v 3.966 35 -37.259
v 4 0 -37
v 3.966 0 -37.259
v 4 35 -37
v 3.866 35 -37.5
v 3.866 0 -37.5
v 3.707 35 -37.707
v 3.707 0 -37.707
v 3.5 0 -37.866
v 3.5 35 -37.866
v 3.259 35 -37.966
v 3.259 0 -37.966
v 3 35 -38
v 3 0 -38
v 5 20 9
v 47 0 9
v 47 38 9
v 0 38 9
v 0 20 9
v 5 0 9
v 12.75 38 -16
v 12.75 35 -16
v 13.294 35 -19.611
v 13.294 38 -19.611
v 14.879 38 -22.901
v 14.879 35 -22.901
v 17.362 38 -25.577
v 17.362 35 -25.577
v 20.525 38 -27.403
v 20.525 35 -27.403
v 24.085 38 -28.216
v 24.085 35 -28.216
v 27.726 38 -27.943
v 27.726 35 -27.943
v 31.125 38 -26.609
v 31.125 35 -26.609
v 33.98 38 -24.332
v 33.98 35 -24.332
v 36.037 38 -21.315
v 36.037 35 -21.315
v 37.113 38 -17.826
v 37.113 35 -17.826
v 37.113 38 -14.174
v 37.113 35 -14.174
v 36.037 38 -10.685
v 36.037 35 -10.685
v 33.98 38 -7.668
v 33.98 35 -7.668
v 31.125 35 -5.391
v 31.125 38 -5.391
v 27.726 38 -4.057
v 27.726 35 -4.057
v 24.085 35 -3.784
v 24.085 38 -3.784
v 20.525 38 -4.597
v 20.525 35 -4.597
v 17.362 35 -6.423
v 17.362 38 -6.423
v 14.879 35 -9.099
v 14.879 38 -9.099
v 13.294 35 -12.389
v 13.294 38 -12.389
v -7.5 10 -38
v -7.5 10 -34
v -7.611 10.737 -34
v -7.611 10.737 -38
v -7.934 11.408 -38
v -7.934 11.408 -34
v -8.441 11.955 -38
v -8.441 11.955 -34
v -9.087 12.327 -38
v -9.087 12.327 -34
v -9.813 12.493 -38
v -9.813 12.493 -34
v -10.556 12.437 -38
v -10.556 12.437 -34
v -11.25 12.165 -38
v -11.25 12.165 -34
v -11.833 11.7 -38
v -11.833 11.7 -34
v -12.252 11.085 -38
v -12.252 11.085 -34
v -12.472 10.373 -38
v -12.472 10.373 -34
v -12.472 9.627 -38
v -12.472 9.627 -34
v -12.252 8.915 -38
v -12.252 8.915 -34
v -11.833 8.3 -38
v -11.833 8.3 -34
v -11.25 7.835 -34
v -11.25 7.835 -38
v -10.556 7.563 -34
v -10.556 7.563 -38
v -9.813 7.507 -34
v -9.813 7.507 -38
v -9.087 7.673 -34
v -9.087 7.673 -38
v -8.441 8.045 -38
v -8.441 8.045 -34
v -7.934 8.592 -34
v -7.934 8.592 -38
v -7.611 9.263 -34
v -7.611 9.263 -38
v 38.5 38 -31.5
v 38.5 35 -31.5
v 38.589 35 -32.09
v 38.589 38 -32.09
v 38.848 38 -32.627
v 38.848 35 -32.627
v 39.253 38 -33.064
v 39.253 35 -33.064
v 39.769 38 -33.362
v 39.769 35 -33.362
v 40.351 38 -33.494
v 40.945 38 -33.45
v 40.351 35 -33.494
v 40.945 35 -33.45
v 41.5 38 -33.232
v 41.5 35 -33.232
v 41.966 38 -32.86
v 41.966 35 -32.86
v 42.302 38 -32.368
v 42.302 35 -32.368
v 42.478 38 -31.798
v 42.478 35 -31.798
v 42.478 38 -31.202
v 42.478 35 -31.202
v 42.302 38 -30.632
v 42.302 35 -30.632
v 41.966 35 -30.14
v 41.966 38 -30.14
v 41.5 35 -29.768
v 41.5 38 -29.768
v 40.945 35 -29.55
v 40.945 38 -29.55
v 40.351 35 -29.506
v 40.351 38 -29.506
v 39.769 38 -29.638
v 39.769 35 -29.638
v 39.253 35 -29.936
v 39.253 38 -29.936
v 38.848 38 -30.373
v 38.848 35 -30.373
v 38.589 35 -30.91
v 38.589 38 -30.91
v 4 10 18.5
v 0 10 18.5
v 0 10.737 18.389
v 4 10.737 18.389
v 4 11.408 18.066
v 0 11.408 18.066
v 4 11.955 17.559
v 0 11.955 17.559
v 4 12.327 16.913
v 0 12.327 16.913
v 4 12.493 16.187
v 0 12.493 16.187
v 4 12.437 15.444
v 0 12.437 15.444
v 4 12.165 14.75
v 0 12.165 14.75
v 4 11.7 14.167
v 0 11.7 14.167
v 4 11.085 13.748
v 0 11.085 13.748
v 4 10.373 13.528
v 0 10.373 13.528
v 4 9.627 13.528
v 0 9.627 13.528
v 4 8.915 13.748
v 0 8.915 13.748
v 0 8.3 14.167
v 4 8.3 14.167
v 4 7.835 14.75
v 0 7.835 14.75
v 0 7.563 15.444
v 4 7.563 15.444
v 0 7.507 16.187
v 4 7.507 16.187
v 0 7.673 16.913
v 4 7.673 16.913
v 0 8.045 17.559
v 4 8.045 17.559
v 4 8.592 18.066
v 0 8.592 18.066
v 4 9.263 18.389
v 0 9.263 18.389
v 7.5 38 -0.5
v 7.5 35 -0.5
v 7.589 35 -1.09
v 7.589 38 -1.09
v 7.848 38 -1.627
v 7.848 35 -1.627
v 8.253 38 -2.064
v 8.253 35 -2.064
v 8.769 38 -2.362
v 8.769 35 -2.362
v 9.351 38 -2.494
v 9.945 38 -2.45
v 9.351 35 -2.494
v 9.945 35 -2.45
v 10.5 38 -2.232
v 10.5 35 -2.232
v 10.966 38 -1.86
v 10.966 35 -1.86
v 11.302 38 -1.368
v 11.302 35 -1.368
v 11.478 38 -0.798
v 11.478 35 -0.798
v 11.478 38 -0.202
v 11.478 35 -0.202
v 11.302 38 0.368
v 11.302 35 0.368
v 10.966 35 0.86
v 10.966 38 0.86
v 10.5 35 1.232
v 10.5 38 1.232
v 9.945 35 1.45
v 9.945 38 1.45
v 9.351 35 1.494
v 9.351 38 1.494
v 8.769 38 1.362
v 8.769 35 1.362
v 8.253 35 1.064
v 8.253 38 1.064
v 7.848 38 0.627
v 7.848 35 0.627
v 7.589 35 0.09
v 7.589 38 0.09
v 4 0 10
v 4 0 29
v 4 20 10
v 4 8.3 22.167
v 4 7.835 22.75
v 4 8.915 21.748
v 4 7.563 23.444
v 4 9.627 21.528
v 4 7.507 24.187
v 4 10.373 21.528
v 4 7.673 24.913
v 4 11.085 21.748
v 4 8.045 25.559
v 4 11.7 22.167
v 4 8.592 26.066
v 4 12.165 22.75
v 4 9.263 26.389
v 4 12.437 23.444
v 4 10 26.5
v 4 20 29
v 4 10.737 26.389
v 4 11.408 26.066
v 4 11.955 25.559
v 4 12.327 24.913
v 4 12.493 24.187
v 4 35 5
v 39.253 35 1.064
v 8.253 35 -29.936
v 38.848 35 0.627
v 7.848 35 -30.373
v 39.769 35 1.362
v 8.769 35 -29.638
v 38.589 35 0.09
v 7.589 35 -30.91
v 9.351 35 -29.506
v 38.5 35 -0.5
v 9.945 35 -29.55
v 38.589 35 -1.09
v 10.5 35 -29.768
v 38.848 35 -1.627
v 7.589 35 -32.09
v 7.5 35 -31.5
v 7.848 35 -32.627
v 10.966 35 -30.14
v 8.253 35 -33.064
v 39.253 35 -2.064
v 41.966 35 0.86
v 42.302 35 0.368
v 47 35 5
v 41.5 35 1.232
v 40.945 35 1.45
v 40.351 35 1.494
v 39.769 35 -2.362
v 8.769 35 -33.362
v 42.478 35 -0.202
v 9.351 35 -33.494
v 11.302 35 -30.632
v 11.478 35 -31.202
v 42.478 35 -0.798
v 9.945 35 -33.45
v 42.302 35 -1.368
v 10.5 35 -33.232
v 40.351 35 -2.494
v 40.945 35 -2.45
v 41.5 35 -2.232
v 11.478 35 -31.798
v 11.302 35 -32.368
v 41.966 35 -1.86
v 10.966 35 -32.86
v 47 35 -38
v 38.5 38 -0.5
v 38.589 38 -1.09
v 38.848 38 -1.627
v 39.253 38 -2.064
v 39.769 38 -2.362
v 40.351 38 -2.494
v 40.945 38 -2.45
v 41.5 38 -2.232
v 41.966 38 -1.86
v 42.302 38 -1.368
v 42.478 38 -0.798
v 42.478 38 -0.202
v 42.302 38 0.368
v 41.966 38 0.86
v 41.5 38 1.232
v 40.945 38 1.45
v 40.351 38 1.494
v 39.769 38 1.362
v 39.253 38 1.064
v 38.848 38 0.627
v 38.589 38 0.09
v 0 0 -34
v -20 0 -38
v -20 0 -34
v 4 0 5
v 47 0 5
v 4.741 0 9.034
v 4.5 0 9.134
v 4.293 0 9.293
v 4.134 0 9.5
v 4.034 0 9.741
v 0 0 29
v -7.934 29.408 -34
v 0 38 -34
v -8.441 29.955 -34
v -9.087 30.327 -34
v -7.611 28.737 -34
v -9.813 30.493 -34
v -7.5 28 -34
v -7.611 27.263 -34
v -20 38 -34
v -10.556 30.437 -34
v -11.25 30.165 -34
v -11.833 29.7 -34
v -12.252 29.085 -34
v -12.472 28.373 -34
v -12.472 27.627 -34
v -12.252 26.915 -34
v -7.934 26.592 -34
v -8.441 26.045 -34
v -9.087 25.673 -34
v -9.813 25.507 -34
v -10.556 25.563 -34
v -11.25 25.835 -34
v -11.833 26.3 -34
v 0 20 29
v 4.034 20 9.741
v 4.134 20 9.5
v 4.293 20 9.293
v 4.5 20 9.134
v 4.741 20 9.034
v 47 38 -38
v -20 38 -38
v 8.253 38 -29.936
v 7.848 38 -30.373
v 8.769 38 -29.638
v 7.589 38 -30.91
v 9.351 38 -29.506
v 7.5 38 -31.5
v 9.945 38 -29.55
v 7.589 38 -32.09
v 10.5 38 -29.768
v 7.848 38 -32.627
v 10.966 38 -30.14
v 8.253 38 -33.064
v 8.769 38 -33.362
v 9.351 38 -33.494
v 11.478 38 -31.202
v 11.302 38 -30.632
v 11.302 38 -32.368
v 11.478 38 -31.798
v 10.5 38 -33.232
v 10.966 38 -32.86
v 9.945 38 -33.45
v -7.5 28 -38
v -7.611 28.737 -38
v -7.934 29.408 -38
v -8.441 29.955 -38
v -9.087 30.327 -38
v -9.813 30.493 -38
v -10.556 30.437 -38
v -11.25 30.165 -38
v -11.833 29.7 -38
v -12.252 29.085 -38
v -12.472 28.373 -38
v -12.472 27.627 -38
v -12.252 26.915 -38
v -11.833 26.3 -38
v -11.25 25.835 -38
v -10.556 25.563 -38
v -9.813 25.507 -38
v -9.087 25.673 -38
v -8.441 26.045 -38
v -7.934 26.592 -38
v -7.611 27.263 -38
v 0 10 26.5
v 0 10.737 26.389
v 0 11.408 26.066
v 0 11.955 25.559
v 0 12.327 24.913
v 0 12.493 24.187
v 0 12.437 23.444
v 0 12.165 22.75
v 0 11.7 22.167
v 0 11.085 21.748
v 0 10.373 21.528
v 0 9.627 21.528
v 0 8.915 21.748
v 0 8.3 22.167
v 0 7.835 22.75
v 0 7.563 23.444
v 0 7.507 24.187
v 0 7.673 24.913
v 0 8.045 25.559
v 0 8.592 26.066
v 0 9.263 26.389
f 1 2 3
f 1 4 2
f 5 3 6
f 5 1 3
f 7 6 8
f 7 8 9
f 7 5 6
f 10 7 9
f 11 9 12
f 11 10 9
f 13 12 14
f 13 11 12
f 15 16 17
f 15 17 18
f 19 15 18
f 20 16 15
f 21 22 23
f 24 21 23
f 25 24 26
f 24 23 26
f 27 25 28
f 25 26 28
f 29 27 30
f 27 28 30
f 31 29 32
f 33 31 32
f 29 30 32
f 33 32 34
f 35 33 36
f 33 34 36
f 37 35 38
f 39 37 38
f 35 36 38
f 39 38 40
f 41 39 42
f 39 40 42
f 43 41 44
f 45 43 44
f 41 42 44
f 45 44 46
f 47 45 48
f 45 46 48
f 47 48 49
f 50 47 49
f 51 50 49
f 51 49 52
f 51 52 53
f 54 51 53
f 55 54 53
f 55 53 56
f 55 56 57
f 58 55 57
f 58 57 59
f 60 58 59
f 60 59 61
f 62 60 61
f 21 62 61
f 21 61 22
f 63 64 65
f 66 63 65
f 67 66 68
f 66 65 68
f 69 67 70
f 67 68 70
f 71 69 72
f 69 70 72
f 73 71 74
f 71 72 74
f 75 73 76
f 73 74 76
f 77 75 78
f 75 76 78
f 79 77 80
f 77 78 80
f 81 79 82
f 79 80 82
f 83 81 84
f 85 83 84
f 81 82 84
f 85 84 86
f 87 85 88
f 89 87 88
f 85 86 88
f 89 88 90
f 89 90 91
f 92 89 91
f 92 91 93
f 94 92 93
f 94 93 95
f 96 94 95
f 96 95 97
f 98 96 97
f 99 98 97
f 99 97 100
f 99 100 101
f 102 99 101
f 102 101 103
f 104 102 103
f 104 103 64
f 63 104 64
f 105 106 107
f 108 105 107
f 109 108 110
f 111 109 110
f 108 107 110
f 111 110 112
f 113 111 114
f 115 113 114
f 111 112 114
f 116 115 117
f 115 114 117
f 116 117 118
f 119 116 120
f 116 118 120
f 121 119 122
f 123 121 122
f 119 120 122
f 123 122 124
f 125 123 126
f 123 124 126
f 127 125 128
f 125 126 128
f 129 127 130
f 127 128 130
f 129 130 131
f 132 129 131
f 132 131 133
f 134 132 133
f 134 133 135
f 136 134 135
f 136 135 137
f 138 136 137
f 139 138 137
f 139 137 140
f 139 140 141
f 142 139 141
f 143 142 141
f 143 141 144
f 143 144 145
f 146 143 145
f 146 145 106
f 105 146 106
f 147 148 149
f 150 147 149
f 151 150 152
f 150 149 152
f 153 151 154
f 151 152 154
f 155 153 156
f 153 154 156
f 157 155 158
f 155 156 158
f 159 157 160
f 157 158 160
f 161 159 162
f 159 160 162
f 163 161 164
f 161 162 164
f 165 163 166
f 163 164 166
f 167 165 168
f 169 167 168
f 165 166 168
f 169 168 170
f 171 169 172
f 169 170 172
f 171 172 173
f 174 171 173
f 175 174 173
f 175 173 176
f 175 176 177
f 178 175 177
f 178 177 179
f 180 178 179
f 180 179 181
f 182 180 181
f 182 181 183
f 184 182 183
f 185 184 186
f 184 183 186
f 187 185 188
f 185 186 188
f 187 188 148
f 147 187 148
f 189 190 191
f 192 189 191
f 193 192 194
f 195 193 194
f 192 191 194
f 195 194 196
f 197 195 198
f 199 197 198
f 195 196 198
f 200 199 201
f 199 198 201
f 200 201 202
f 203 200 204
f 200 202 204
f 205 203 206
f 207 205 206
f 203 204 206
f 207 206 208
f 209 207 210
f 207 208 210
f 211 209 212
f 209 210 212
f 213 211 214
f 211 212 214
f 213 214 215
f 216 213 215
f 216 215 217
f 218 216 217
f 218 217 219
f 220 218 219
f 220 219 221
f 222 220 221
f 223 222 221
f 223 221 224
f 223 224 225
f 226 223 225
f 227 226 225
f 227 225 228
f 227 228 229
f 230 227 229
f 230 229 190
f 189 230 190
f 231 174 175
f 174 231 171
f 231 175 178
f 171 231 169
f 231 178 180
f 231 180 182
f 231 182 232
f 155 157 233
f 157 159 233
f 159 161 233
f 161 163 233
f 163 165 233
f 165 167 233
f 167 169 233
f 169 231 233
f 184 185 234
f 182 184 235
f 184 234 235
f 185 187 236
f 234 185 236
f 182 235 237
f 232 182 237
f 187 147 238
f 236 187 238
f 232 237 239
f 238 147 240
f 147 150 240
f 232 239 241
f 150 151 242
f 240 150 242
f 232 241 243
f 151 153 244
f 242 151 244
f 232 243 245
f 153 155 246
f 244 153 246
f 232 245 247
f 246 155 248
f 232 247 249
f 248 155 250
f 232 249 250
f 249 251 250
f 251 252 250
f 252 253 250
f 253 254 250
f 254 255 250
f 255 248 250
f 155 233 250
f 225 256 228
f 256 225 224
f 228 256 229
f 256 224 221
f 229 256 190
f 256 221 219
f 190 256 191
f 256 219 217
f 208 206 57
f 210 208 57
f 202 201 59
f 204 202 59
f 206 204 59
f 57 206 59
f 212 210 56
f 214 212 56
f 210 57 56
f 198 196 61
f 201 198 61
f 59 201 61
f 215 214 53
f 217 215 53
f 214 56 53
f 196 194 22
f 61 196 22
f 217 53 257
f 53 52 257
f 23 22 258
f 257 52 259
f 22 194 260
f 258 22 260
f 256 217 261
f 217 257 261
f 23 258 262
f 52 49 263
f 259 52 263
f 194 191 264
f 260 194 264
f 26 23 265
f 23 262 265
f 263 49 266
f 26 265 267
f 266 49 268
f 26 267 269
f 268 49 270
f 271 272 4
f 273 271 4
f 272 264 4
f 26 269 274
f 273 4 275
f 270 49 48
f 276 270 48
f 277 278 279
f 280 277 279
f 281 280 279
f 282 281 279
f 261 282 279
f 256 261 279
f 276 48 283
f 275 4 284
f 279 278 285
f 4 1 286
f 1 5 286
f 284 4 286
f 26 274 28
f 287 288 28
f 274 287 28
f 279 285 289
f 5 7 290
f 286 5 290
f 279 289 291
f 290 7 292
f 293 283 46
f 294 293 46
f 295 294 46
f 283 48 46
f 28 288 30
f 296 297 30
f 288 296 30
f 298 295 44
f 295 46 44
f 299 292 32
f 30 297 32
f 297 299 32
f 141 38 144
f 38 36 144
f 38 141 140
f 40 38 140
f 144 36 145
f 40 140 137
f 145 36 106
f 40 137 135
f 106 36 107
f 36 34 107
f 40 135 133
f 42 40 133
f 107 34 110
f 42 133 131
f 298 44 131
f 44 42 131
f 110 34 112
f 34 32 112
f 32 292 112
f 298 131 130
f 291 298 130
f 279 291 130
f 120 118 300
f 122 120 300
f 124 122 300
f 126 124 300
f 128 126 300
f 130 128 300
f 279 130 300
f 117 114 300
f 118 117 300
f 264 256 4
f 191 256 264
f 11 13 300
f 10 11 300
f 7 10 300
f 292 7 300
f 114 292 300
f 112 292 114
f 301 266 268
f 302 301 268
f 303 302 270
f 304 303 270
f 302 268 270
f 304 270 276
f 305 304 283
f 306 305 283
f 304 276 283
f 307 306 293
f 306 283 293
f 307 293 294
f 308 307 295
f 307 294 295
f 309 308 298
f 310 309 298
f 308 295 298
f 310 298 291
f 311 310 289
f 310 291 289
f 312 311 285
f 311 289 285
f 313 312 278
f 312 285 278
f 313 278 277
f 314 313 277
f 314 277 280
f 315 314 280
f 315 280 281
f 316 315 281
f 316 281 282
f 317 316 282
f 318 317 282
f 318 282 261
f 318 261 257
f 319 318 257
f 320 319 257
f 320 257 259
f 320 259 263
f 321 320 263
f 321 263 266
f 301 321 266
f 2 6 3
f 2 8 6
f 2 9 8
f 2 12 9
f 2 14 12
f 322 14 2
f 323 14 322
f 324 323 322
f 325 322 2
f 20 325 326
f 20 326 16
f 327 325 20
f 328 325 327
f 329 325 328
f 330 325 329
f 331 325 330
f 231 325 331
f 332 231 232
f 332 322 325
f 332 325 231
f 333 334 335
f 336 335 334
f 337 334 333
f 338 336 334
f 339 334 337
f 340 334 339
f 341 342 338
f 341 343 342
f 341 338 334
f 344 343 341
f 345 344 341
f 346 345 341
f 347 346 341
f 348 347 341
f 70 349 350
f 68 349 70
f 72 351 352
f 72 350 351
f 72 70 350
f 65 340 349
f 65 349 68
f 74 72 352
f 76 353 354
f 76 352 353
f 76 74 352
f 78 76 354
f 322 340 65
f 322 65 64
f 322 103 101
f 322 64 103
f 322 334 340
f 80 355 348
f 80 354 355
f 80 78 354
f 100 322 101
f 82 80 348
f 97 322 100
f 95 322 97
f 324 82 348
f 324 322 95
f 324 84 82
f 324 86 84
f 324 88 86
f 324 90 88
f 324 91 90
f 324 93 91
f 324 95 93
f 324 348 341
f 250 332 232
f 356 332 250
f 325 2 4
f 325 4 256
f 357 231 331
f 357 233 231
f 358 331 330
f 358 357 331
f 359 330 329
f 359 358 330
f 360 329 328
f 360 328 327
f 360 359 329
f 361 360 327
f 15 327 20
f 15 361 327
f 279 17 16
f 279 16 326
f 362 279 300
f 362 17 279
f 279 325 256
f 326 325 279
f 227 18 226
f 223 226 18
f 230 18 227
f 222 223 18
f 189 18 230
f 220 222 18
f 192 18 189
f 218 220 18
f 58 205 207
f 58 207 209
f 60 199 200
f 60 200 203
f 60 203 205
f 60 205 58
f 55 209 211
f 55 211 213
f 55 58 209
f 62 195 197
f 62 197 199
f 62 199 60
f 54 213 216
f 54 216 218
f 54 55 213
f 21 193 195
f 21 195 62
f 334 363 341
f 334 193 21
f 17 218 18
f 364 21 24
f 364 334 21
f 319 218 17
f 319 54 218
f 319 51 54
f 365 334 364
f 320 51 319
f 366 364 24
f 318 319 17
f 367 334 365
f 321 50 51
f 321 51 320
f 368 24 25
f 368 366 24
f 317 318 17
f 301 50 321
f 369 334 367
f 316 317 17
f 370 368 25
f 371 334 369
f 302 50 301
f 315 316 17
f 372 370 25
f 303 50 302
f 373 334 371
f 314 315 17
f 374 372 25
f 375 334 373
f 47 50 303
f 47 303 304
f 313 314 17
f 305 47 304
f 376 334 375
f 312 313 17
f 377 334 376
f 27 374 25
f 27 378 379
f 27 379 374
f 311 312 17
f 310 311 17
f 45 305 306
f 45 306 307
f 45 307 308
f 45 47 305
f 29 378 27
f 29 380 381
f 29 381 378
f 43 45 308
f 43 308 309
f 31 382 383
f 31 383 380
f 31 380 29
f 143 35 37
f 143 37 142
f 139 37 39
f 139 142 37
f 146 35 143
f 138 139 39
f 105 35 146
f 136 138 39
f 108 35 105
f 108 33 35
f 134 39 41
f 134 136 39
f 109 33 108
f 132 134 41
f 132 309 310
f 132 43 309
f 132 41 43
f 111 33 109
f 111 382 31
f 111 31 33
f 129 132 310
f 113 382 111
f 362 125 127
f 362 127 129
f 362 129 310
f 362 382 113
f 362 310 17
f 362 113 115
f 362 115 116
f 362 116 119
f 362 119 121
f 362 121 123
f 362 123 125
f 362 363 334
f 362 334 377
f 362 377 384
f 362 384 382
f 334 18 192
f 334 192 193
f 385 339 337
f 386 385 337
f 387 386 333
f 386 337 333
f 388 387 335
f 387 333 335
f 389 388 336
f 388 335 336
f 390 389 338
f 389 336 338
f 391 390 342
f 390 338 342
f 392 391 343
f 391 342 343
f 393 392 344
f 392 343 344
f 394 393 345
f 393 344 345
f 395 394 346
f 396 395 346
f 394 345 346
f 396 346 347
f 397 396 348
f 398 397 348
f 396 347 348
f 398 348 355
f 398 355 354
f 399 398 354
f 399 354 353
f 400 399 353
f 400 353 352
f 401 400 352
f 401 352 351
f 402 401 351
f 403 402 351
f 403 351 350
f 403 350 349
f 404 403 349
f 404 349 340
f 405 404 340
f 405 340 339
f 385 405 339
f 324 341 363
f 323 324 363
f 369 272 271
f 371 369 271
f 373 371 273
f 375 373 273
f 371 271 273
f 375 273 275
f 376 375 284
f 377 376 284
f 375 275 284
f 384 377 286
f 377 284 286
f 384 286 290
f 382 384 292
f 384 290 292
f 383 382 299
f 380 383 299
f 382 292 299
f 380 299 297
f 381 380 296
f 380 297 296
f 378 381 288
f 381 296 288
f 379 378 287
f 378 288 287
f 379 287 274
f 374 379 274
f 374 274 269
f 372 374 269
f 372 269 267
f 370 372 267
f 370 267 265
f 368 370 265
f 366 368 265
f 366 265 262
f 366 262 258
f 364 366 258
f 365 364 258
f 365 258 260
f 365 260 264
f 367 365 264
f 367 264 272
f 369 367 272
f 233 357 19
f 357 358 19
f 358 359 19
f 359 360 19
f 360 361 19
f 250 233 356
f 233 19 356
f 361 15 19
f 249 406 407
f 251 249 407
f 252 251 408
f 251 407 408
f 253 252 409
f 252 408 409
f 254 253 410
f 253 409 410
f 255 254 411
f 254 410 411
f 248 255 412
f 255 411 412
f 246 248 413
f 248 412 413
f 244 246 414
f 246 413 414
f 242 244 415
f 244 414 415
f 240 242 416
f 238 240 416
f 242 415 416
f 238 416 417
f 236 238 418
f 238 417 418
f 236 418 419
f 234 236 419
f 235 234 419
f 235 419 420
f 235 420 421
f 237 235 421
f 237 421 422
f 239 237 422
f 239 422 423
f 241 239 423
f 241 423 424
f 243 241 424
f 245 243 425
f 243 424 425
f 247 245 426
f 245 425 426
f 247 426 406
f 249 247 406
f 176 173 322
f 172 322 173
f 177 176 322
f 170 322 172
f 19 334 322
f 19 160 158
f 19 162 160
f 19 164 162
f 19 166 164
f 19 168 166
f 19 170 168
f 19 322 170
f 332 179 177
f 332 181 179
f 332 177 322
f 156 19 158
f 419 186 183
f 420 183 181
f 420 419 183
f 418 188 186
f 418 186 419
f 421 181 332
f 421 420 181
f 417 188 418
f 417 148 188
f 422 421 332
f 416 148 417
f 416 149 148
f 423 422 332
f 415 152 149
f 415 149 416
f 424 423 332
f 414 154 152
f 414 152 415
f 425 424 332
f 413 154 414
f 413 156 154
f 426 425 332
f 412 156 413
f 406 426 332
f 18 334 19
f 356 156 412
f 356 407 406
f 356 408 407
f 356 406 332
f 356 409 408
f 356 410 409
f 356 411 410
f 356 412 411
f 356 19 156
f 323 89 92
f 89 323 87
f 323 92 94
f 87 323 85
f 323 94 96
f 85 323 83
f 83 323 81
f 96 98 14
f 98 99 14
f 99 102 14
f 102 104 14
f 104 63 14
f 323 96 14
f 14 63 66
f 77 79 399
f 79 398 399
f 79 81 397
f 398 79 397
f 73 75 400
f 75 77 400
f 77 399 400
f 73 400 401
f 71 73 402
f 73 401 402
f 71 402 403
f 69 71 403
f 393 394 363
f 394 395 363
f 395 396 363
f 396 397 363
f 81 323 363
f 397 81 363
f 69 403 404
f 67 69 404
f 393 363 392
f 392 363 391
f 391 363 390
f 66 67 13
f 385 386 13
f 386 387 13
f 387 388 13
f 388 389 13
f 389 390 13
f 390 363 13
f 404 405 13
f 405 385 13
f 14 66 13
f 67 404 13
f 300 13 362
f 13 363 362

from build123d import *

# Parameters (mm, degrees)
BOSS_EXTRUDE1_DEPTH = 38
SKETCH2_W           = 43
SKETCH2_H           = 43
BOSS_EXTRUDE2_DEPTH = 3
SKETCH3_R           = 2
SKETCH3_R_2         = 12.25
CUT_EXTRUDE1_DEPTH  = 10
SKETCH4_R           = 2.5
CUT_EXTRUDE2_DEPTH  = 10
SKETCH5_W           = 20
SKETCH5_H           = 20
SKETCH5_R           = 2.5
BOSS_EXTRUDE3_DEPTH = 4
FILLET1_R           = 1


with BuildPart() as part:
    # Sketch1 → Boss-Extrude1 (new body)
    with BuildSketch(Plane(origin=(0, 0, 0), x_dir=(1, 0, 0), z_dir=(0, 1, 0))):
        Polygon((0, 0), (0, 34), (-20, 34), (-20, 38), (4, 38), (4, -5), (47, -5), (47, -9), (0, -9), align=None)
    extrude(amount=BOSS_EXTRUDE1_DEPTH)

    # Sketch2 → Boss-Extrude2 (add)
    with BuildSketch(Plane(origin=(0, 38, 0), x_dir=(1, 0, 0), z_dir=(0, 1, 0))):
        with Locations((25.5, 16.5)):
            Rectangle(SKETCH2_W, SKETCH2_H)
    extrude(amount=-BOSS_EXTRUDE2_DEPTH)

    # Sketch3 → Cut-Extrude1 (cut)
    with BuildSketch(Plane(origin=(0, 35, 0), x_dir=(-1, 0, 0), z_dir=(0, -1, 0))):
        with Locations((-40.5, 31.5)):
            Circle(SKETCH3_R)
        with Locations((-9.5, 31.5)):
            Circle(SKETCH3_R)
        with Locations((-9.5, 0.5)):
            Circle(SKETCH3_R)
        with Locations((-40.5, 0.5)):
            Circle(SKETCH3_R)
        with Locations((-25, 16)):
            Circle(SKETCH3_R_2)
    extrude(amount=-CUT_EXTRUDE1_DEPTH, mode=Mode.SUBTRACT)

    # Sketch4 → Cut-Extrude2 (cut)
    with BuildSketch(Plane.XY.offset(-34)):
        with Locations((-10, 10)):
            Circle(SKETCH4_R)
        with Locations((-10, 28)):
            Circle(SKETCH4_R)
    extrude(amount=-CUT_EXTRUDE2_DEPTH, mode=Mode.SUBTRACT)

    # Sketch5 → Boss-Extrude3 (add)
    with BuildSketch(Plane.ZY):
        with Locations((19, 10)):
            Rectangle(SKETCH5_W, SKETCH5_H)
        with Locations((16, 10)):
            Circle(SKETCH5_R, mode=Mode.SUBTRACT)
        with Locations((24, 10)):
            Circle(SKETCH5_R, mode=Mode.SUBTRACT)
    extrude(amount=-BOSS_EXTRUDE3_DEPTH)

    # Fillet1
    fillet1_edges = [part.edges().sort_by_distance(p)[0] for p in [
        (4, 17.5, -38),
        (4, 10, 9),
    ]]
    fillet(fillet1_edges, radius=FILLET1_R)


solid = part.part
